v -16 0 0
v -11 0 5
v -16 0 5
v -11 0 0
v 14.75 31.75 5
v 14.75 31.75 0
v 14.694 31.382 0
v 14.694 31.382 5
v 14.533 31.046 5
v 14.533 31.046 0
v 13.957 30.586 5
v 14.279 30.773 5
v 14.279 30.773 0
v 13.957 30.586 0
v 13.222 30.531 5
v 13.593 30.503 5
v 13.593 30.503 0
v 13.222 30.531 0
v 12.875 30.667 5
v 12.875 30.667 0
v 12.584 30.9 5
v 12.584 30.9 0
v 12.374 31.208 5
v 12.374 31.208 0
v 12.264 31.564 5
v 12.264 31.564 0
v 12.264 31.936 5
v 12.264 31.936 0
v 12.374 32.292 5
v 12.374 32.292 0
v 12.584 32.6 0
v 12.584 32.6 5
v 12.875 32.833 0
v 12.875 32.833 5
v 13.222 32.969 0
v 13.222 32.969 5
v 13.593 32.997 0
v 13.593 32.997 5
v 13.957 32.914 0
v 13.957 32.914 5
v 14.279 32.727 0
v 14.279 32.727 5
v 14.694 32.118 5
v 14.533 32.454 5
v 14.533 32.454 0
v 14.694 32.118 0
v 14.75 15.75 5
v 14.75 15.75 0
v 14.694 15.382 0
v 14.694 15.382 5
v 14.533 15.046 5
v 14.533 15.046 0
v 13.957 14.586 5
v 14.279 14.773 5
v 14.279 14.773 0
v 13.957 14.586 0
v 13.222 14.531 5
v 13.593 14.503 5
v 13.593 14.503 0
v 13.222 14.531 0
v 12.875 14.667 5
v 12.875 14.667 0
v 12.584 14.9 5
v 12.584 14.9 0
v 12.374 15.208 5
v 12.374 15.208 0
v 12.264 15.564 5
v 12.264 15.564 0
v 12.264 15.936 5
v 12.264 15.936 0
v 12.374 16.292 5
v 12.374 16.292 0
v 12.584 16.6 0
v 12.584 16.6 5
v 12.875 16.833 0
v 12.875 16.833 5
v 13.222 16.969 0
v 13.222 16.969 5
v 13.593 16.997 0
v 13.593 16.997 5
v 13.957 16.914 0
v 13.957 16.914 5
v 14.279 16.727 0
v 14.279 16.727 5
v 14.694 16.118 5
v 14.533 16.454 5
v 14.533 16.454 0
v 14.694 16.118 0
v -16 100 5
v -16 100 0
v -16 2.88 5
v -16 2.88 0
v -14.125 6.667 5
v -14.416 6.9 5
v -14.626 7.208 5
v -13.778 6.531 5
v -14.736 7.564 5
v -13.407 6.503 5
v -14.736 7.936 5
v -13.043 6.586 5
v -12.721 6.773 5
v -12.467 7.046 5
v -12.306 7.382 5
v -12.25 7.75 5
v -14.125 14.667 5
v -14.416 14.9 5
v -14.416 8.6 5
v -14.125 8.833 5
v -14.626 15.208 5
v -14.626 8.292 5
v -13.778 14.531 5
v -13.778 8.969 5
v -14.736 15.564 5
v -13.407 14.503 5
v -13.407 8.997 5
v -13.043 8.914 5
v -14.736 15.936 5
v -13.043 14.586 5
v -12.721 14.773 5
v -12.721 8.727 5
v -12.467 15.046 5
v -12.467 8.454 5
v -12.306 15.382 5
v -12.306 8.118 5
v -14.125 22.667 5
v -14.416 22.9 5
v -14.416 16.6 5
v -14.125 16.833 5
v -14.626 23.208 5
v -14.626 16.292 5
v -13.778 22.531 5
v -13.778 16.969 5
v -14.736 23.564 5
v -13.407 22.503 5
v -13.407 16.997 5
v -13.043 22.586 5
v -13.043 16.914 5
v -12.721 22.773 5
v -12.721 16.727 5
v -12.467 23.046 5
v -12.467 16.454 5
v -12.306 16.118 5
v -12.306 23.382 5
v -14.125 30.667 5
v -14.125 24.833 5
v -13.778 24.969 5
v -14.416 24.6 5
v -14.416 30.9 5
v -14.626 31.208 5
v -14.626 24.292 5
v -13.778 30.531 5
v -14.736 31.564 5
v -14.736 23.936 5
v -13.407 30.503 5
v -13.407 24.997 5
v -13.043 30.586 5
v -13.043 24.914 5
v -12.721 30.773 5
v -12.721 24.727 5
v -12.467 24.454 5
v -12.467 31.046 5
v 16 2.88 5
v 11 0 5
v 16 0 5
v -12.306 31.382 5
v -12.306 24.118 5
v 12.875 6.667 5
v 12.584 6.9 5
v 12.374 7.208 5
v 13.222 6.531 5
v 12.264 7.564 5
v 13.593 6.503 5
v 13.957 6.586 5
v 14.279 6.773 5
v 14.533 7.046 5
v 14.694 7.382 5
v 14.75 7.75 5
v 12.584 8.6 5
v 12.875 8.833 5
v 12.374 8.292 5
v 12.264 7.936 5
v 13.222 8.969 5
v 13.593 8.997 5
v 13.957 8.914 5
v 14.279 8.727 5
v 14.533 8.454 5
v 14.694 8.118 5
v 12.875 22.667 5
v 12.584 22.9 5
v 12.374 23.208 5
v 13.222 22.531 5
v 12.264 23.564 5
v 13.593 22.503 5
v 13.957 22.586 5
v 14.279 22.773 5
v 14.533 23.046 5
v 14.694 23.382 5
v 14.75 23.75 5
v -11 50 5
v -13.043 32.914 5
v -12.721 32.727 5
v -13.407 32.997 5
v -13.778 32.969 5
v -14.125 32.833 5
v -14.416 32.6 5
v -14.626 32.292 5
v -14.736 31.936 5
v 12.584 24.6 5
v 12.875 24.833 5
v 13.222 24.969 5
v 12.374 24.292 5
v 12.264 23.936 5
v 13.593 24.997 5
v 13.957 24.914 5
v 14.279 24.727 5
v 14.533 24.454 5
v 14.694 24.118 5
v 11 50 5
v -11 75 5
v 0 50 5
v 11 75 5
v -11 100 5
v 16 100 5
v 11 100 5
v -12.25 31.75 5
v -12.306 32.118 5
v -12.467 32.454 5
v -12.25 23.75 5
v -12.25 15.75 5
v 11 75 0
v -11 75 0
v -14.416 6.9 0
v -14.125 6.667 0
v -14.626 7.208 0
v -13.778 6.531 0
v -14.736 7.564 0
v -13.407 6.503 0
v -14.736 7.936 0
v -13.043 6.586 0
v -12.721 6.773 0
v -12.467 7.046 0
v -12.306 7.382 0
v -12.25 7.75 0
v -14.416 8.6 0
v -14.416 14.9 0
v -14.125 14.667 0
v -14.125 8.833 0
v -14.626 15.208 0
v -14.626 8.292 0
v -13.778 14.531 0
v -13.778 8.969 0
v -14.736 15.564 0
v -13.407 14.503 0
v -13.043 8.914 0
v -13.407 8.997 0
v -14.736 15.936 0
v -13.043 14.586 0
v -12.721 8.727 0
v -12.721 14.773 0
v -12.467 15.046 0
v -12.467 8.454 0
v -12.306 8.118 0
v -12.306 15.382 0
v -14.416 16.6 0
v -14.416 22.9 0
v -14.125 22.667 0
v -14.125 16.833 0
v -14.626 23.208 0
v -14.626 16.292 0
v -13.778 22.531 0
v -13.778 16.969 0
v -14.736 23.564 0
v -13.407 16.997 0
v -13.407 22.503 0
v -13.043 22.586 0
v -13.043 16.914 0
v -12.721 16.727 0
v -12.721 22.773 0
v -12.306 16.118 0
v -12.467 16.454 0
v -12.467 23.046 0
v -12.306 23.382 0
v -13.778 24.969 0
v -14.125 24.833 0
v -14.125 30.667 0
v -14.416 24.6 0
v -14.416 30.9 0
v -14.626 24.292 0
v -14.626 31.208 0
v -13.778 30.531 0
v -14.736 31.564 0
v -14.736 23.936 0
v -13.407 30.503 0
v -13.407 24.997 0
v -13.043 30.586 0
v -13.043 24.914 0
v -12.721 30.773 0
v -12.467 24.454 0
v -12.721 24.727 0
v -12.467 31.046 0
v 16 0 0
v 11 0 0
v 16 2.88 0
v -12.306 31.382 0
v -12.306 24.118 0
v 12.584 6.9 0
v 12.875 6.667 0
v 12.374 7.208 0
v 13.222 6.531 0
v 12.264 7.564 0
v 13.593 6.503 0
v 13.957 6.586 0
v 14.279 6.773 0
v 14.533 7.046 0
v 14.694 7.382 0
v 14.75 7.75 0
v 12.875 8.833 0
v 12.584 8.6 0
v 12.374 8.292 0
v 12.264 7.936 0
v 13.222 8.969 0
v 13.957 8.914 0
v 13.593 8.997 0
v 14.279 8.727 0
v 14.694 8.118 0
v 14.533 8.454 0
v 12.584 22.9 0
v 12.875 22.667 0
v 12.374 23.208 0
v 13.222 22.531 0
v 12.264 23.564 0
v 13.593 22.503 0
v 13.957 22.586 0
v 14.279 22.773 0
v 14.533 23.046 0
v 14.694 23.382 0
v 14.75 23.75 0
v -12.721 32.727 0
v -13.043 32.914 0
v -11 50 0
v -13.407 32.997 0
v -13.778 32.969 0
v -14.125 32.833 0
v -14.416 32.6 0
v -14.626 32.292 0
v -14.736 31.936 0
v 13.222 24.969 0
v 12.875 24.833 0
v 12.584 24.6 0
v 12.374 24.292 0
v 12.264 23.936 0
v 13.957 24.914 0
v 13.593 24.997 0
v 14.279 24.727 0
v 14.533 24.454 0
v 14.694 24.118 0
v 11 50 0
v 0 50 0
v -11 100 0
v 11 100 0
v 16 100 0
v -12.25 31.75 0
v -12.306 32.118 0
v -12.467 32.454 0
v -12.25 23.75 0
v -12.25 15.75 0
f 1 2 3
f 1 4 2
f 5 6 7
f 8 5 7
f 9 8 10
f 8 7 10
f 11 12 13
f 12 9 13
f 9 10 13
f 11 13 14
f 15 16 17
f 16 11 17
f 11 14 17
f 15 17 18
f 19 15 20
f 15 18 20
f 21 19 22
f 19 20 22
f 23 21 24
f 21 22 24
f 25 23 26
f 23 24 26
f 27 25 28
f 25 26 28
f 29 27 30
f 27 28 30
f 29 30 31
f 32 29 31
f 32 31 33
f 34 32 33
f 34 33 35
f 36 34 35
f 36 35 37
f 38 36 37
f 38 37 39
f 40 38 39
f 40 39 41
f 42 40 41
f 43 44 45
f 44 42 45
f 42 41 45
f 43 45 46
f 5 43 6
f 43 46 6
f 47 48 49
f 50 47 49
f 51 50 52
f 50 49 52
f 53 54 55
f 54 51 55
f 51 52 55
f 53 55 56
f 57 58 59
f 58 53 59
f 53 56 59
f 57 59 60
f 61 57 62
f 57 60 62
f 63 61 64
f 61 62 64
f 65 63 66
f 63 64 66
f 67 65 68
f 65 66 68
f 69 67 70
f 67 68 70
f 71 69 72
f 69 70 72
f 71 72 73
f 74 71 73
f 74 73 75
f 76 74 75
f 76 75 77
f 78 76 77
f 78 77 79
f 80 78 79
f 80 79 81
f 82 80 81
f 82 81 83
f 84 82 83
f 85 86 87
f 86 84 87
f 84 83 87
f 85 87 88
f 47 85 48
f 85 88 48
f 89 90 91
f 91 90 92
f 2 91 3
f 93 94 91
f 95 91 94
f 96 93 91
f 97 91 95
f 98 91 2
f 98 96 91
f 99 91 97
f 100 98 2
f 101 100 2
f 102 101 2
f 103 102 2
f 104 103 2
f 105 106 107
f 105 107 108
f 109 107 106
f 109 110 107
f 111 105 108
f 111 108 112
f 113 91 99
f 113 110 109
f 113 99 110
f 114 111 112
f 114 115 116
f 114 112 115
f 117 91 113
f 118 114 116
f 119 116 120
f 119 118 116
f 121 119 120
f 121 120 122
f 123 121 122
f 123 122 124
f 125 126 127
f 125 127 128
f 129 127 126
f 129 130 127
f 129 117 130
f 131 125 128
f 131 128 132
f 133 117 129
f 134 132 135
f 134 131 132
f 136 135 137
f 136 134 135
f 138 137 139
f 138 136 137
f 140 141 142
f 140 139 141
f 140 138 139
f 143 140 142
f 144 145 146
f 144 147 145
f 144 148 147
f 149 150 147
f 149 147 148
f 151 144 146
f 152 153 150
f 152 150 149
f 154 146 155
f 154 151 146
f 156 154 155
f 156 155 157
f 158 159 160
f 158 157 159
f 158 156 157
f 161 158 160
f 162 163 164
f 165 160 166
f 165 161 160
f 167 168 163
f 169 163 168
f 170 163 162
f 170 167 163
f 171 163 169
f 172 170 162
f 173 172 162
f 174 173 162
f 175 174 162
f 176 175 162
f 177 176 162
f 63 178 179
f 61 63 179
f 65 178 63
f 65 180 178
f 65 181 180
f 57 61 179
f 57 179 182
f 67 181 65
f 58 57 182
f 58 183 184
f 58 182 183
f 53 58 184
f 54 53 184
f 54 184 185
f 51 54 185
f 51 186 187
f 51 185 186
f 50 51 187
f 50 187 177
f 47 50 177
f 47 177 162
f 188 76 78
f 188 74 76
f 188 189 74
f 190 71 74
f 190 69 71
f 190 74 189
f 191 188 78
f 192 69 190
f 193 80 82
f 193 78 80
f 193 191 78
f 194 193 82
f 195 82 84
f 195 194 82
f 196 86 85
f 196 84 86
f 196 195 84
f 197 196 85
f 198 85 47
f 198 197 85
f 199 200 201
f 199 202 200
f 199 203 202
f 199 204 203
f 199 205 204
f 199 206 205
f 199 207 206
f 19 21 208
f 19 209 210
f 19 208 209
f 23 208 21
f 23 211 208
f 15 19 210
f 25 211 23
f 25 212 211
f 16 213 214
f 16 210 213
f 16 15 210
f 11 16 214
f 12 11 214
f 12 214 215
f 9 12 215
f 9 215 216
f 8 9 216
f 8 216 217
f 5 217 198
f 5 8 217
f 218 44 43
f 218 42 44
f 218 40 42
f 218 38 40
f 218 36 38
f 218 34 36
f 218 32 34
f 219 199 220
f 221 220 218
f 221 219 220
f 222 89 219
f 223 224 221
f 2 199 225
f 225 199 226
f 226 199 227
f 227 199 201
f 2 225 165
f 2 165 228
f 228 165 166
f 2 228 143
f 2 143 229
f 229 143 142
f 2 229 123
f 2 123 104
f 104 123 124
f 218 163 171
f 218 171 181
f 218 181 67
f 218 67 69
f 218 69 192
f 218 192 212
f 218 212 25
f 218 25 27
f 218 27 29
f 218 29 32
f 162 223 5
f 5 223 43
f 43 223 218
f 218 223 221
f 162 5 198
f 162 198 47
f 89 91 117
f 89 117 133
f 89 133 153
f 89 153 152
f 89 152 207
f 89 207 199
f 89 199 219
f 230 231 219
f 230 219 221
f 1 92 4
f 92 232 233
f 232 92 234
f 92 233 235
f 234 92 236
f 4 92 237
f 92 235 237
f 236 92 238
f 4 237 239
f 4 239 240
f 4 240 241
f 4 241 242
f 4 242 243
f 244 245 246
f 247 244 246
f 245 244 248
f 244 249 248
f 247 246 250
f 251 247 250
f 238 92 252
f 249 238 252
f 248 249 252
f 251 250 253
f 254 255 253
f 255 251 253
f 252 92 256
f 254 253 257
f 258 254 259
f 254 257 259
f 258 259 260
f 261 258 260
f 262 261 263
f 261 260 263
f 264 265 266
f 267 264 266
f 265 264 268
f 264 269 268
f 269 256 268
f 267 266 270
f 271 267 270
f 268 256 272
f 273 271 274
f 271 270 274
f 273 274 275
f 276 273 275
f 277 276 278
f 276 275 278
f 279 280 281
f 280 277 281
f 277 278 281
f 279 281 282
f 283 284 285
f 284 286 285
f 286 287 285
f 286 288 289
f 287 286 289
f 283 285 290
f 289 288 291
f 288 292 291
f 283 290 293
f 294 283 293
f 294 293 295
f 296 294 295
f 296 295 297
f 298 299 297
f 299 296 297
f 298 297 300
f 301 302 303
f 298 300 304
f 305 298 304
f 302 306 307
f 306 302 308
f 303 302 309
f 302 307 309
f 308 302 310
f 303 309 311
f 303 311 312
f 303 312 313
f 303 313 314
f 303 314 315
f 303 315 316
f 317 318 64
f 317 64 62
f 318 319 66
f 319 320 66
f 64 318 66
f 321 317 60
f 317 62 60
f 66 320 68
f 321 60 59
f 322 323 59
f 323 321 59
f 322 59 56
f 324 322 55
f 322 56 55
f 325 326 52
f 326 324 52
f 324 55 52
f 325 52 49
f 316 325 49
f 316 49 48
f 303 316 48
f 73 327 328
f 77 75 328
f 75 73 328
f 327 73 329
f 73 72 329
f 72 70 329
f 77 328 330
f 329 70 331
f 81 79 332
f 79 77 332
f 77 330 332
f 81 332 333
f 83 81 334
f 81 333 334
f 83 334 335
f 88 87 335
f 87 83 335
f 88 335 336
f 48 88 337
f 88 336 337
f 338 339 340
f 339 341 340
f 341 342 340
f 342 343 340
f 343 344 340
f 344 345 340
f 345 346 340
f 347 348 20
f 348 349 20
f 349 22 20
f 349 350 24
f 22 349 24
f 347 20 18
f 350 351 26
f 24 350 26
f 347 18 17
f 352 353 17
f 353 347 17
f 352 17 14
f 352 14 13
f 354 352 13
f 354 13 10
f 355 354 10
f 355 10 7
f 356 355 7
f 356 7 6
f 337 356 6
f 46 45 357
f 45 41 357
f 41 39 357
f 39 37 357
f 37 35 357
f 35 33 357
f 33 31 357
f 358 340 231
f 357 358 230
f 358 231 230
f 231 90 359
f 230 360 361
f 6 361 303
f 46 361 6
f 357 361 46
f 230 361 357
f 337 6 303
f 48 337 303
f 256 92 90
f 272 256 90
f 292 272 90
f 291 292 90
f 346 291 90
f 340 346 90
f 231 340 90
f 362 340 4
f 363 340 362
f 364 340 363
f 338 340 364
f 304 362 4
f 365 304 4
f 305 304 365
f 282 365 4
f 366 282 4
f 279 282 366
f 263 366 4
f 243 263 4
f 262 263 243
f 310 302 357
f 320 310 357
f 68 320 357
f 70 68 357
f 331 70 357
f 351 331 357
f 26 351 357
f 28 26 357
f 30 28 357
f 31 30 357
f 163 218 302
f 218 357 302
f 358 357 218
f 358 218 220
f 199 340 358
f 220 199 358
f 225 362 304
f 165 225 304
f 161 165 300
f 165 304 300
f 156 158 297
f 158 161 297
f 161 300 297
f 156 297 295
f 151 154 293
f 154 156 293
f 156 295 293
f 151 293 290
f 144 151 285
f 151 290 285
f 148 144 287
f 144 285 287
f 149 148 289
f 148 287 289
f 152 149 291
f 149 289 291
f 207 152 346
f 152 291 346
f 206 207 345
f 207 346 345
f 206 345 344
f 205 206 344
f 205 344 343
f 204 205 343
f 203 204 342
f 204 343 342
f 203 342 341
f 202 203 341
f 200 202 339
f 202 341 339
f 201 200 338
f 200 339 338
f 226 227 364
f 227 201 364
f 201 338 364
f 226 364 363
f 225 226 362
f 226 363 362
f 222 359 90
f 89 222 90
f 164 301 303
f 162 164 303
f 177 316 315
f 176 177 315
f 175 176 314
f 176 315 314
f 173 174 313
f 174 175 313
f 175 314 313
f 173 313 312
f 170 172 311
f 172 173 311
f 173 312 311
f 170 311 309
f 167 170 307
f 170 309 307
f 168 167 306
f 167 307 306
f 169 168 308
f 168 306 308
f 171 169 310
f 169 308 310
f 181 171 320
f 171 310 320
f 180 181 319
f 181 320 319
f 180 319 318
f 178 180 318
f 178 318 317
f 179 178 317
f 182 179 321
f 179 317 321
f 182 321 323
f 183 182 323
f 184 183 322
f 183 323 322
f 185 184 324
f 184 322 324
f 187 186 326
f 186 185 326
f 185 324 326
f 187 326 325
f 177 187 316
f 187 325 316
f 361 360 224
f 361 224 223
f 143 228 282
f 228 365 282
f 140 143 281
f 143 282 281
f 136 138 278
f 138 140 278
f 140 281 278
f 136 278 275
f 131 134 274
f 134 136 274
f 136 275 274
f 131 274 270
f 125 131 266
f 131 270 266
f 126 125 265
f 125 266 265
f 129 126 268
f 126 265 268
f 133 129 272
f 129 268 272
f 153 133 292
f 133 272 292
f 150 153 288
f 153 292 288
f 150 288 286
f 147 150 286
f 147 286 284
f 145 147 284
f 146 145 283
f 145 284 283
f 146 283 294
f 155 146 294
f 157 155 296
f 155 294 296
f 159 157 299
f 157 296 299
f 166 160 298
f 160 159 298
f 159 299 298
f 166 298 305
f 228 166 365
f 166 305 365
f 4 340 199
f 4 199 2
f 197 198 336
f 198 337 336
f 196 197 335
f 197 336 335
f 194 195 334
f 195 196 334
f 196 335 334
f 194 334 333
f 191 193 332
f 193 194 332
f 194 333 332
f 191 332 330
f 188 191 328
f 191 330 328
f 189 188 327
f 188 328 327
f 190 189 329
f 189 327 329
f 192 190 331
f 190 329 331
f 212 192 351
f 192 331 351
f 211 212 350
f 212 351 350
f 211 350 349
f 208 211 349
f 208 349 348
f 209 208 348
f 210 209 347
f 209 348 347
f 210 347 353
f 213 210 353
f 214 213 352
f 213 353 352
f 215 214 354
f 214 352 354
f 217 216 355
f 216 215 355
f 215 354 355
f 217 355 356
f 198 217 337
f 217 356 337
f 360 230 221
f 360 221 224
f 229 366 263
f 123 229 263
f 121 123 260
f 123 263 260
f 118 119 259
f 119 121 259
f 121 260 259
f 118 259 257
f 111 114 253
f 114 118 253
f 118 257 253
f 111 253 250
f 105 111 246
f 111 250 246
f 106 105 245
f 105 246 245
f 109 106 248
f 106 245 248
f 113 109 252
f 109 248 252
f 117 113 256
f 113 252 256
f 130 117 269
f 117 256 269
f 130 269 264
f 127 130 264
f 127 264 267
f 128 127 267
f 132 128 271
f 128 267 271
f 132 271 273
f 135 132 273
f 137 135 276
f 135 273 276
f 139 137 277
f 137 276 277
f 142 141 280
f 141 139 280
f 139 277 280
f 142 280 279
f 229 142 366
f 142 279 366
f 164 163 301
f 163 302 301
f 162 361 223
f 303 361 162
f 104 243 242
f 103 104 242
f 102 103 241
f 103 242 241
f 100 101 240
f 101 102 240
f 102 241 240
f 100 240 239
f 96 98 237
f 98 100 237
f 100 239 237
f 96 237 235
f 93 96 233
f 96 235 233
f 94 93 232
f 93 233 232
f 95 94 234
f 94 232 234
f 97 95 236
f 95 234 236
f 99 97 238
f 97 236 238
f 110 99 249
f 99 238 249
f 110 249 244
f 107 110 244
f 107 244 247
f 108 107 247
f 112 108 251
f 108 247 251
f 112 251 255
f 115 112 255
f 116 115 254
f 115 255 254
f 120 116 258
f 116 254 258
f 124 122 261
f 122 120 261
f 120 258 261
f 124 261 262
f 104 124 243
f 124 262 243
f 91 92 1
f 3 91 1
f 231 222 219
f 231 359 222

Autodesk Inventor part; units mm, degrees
ref_plane "YZ Plane" through (0, 0, 0) normal (1, 0, 0) x (0, 1, 0)
ref_plane "XZ Plane" through (0, 0, 0) normal (0, 1, 0) x (-1, 0, 0)
ref_plane "XY Plane" through (0, 0, 0) normal (0, 0, 1) x (1, 0, 0)
sketch "Sketch1" plane through (0, 0, 0) normal (0, 0, 1) x (1, 0, 0)
  line L0 (11, 50) -> (11, 0)
  line L1 (11, 0) -> (16, 0)
  line L2 (16, 0) -> (16, 2.88)
  line L3 (11, 50) -> (0, 50)
  line L4 (0, 50) -> (0, 100) construction
  line L5 (11, 100) -> (16, 100)
  line L6 (16, 100) -> (16, 2.88)
  circle A0 centre (13.5, 7.75) radius 1.25
  circle A1 centre (13.5, 15.75) radius 1.25
  circle A2 centre (13.5, 23.75) radius 1.25
  circle A3 centre (13.5, 31.75) radius 1.25
  line L7 (-11, 50) -> (-11, 0)
  line L8 (-11, 0) -> (-16, 0)
  line L9 (-11, 50) -> (0, 50)
  line L10 (-11, 100) -> (-16, 100)
  line L11 (-16, 100) -> (-16, 2.88)
  circle A4 centre (-13.5, 7.75) radius 1.25
  circle A5 centre (-13.5, 15.75) radius 1.25
  circle A6 centre (-13.5, 23.75) radius 1.25
  circle A7 centre (-13.5, 31.75) radius 1.25
  line L12 (-16, 2.88) -> (-16, 0)
  line L13 (-11, 100) -> (-11, 75)
  line L14 (-11, 75) -> (11, 75)
  line L15 (11, 75) -> (11, 100)
  point P0 (0, 0)
  dimension "d0" = 5
  dimension "d1" = 100
  dimension "d2" = 11
  dimension "d3" = 50
  dimension "d4" = 0
  dimension "d5" = 0
  dimension "d6" = 2.5
  dimension "d7" = 2.5
  dimension "d8" = 7.75
  dimension "d9" = 0
  dimension "d10" = 8
  dimension "d11" = 2.5
  dimension "d12" = 0
  dimension "d13" = 8
  dimension "d14" = 2.5
  dimension "d15" = 2.5
  dimension "d16" = 0
  dimension "d17" = 8
  dimension "d18" = 5
  dimension "d19" = 5
  dimension "d20" = 25
  dimension "d21" = 0
extrude "Extrusion1" add sketch "Sketch1" along normal blind 5
equation "\"d11\" = d6"
equation "\"d14\" = d6"
equation "\"d15\" = d6"
properties part number "Bridge"
